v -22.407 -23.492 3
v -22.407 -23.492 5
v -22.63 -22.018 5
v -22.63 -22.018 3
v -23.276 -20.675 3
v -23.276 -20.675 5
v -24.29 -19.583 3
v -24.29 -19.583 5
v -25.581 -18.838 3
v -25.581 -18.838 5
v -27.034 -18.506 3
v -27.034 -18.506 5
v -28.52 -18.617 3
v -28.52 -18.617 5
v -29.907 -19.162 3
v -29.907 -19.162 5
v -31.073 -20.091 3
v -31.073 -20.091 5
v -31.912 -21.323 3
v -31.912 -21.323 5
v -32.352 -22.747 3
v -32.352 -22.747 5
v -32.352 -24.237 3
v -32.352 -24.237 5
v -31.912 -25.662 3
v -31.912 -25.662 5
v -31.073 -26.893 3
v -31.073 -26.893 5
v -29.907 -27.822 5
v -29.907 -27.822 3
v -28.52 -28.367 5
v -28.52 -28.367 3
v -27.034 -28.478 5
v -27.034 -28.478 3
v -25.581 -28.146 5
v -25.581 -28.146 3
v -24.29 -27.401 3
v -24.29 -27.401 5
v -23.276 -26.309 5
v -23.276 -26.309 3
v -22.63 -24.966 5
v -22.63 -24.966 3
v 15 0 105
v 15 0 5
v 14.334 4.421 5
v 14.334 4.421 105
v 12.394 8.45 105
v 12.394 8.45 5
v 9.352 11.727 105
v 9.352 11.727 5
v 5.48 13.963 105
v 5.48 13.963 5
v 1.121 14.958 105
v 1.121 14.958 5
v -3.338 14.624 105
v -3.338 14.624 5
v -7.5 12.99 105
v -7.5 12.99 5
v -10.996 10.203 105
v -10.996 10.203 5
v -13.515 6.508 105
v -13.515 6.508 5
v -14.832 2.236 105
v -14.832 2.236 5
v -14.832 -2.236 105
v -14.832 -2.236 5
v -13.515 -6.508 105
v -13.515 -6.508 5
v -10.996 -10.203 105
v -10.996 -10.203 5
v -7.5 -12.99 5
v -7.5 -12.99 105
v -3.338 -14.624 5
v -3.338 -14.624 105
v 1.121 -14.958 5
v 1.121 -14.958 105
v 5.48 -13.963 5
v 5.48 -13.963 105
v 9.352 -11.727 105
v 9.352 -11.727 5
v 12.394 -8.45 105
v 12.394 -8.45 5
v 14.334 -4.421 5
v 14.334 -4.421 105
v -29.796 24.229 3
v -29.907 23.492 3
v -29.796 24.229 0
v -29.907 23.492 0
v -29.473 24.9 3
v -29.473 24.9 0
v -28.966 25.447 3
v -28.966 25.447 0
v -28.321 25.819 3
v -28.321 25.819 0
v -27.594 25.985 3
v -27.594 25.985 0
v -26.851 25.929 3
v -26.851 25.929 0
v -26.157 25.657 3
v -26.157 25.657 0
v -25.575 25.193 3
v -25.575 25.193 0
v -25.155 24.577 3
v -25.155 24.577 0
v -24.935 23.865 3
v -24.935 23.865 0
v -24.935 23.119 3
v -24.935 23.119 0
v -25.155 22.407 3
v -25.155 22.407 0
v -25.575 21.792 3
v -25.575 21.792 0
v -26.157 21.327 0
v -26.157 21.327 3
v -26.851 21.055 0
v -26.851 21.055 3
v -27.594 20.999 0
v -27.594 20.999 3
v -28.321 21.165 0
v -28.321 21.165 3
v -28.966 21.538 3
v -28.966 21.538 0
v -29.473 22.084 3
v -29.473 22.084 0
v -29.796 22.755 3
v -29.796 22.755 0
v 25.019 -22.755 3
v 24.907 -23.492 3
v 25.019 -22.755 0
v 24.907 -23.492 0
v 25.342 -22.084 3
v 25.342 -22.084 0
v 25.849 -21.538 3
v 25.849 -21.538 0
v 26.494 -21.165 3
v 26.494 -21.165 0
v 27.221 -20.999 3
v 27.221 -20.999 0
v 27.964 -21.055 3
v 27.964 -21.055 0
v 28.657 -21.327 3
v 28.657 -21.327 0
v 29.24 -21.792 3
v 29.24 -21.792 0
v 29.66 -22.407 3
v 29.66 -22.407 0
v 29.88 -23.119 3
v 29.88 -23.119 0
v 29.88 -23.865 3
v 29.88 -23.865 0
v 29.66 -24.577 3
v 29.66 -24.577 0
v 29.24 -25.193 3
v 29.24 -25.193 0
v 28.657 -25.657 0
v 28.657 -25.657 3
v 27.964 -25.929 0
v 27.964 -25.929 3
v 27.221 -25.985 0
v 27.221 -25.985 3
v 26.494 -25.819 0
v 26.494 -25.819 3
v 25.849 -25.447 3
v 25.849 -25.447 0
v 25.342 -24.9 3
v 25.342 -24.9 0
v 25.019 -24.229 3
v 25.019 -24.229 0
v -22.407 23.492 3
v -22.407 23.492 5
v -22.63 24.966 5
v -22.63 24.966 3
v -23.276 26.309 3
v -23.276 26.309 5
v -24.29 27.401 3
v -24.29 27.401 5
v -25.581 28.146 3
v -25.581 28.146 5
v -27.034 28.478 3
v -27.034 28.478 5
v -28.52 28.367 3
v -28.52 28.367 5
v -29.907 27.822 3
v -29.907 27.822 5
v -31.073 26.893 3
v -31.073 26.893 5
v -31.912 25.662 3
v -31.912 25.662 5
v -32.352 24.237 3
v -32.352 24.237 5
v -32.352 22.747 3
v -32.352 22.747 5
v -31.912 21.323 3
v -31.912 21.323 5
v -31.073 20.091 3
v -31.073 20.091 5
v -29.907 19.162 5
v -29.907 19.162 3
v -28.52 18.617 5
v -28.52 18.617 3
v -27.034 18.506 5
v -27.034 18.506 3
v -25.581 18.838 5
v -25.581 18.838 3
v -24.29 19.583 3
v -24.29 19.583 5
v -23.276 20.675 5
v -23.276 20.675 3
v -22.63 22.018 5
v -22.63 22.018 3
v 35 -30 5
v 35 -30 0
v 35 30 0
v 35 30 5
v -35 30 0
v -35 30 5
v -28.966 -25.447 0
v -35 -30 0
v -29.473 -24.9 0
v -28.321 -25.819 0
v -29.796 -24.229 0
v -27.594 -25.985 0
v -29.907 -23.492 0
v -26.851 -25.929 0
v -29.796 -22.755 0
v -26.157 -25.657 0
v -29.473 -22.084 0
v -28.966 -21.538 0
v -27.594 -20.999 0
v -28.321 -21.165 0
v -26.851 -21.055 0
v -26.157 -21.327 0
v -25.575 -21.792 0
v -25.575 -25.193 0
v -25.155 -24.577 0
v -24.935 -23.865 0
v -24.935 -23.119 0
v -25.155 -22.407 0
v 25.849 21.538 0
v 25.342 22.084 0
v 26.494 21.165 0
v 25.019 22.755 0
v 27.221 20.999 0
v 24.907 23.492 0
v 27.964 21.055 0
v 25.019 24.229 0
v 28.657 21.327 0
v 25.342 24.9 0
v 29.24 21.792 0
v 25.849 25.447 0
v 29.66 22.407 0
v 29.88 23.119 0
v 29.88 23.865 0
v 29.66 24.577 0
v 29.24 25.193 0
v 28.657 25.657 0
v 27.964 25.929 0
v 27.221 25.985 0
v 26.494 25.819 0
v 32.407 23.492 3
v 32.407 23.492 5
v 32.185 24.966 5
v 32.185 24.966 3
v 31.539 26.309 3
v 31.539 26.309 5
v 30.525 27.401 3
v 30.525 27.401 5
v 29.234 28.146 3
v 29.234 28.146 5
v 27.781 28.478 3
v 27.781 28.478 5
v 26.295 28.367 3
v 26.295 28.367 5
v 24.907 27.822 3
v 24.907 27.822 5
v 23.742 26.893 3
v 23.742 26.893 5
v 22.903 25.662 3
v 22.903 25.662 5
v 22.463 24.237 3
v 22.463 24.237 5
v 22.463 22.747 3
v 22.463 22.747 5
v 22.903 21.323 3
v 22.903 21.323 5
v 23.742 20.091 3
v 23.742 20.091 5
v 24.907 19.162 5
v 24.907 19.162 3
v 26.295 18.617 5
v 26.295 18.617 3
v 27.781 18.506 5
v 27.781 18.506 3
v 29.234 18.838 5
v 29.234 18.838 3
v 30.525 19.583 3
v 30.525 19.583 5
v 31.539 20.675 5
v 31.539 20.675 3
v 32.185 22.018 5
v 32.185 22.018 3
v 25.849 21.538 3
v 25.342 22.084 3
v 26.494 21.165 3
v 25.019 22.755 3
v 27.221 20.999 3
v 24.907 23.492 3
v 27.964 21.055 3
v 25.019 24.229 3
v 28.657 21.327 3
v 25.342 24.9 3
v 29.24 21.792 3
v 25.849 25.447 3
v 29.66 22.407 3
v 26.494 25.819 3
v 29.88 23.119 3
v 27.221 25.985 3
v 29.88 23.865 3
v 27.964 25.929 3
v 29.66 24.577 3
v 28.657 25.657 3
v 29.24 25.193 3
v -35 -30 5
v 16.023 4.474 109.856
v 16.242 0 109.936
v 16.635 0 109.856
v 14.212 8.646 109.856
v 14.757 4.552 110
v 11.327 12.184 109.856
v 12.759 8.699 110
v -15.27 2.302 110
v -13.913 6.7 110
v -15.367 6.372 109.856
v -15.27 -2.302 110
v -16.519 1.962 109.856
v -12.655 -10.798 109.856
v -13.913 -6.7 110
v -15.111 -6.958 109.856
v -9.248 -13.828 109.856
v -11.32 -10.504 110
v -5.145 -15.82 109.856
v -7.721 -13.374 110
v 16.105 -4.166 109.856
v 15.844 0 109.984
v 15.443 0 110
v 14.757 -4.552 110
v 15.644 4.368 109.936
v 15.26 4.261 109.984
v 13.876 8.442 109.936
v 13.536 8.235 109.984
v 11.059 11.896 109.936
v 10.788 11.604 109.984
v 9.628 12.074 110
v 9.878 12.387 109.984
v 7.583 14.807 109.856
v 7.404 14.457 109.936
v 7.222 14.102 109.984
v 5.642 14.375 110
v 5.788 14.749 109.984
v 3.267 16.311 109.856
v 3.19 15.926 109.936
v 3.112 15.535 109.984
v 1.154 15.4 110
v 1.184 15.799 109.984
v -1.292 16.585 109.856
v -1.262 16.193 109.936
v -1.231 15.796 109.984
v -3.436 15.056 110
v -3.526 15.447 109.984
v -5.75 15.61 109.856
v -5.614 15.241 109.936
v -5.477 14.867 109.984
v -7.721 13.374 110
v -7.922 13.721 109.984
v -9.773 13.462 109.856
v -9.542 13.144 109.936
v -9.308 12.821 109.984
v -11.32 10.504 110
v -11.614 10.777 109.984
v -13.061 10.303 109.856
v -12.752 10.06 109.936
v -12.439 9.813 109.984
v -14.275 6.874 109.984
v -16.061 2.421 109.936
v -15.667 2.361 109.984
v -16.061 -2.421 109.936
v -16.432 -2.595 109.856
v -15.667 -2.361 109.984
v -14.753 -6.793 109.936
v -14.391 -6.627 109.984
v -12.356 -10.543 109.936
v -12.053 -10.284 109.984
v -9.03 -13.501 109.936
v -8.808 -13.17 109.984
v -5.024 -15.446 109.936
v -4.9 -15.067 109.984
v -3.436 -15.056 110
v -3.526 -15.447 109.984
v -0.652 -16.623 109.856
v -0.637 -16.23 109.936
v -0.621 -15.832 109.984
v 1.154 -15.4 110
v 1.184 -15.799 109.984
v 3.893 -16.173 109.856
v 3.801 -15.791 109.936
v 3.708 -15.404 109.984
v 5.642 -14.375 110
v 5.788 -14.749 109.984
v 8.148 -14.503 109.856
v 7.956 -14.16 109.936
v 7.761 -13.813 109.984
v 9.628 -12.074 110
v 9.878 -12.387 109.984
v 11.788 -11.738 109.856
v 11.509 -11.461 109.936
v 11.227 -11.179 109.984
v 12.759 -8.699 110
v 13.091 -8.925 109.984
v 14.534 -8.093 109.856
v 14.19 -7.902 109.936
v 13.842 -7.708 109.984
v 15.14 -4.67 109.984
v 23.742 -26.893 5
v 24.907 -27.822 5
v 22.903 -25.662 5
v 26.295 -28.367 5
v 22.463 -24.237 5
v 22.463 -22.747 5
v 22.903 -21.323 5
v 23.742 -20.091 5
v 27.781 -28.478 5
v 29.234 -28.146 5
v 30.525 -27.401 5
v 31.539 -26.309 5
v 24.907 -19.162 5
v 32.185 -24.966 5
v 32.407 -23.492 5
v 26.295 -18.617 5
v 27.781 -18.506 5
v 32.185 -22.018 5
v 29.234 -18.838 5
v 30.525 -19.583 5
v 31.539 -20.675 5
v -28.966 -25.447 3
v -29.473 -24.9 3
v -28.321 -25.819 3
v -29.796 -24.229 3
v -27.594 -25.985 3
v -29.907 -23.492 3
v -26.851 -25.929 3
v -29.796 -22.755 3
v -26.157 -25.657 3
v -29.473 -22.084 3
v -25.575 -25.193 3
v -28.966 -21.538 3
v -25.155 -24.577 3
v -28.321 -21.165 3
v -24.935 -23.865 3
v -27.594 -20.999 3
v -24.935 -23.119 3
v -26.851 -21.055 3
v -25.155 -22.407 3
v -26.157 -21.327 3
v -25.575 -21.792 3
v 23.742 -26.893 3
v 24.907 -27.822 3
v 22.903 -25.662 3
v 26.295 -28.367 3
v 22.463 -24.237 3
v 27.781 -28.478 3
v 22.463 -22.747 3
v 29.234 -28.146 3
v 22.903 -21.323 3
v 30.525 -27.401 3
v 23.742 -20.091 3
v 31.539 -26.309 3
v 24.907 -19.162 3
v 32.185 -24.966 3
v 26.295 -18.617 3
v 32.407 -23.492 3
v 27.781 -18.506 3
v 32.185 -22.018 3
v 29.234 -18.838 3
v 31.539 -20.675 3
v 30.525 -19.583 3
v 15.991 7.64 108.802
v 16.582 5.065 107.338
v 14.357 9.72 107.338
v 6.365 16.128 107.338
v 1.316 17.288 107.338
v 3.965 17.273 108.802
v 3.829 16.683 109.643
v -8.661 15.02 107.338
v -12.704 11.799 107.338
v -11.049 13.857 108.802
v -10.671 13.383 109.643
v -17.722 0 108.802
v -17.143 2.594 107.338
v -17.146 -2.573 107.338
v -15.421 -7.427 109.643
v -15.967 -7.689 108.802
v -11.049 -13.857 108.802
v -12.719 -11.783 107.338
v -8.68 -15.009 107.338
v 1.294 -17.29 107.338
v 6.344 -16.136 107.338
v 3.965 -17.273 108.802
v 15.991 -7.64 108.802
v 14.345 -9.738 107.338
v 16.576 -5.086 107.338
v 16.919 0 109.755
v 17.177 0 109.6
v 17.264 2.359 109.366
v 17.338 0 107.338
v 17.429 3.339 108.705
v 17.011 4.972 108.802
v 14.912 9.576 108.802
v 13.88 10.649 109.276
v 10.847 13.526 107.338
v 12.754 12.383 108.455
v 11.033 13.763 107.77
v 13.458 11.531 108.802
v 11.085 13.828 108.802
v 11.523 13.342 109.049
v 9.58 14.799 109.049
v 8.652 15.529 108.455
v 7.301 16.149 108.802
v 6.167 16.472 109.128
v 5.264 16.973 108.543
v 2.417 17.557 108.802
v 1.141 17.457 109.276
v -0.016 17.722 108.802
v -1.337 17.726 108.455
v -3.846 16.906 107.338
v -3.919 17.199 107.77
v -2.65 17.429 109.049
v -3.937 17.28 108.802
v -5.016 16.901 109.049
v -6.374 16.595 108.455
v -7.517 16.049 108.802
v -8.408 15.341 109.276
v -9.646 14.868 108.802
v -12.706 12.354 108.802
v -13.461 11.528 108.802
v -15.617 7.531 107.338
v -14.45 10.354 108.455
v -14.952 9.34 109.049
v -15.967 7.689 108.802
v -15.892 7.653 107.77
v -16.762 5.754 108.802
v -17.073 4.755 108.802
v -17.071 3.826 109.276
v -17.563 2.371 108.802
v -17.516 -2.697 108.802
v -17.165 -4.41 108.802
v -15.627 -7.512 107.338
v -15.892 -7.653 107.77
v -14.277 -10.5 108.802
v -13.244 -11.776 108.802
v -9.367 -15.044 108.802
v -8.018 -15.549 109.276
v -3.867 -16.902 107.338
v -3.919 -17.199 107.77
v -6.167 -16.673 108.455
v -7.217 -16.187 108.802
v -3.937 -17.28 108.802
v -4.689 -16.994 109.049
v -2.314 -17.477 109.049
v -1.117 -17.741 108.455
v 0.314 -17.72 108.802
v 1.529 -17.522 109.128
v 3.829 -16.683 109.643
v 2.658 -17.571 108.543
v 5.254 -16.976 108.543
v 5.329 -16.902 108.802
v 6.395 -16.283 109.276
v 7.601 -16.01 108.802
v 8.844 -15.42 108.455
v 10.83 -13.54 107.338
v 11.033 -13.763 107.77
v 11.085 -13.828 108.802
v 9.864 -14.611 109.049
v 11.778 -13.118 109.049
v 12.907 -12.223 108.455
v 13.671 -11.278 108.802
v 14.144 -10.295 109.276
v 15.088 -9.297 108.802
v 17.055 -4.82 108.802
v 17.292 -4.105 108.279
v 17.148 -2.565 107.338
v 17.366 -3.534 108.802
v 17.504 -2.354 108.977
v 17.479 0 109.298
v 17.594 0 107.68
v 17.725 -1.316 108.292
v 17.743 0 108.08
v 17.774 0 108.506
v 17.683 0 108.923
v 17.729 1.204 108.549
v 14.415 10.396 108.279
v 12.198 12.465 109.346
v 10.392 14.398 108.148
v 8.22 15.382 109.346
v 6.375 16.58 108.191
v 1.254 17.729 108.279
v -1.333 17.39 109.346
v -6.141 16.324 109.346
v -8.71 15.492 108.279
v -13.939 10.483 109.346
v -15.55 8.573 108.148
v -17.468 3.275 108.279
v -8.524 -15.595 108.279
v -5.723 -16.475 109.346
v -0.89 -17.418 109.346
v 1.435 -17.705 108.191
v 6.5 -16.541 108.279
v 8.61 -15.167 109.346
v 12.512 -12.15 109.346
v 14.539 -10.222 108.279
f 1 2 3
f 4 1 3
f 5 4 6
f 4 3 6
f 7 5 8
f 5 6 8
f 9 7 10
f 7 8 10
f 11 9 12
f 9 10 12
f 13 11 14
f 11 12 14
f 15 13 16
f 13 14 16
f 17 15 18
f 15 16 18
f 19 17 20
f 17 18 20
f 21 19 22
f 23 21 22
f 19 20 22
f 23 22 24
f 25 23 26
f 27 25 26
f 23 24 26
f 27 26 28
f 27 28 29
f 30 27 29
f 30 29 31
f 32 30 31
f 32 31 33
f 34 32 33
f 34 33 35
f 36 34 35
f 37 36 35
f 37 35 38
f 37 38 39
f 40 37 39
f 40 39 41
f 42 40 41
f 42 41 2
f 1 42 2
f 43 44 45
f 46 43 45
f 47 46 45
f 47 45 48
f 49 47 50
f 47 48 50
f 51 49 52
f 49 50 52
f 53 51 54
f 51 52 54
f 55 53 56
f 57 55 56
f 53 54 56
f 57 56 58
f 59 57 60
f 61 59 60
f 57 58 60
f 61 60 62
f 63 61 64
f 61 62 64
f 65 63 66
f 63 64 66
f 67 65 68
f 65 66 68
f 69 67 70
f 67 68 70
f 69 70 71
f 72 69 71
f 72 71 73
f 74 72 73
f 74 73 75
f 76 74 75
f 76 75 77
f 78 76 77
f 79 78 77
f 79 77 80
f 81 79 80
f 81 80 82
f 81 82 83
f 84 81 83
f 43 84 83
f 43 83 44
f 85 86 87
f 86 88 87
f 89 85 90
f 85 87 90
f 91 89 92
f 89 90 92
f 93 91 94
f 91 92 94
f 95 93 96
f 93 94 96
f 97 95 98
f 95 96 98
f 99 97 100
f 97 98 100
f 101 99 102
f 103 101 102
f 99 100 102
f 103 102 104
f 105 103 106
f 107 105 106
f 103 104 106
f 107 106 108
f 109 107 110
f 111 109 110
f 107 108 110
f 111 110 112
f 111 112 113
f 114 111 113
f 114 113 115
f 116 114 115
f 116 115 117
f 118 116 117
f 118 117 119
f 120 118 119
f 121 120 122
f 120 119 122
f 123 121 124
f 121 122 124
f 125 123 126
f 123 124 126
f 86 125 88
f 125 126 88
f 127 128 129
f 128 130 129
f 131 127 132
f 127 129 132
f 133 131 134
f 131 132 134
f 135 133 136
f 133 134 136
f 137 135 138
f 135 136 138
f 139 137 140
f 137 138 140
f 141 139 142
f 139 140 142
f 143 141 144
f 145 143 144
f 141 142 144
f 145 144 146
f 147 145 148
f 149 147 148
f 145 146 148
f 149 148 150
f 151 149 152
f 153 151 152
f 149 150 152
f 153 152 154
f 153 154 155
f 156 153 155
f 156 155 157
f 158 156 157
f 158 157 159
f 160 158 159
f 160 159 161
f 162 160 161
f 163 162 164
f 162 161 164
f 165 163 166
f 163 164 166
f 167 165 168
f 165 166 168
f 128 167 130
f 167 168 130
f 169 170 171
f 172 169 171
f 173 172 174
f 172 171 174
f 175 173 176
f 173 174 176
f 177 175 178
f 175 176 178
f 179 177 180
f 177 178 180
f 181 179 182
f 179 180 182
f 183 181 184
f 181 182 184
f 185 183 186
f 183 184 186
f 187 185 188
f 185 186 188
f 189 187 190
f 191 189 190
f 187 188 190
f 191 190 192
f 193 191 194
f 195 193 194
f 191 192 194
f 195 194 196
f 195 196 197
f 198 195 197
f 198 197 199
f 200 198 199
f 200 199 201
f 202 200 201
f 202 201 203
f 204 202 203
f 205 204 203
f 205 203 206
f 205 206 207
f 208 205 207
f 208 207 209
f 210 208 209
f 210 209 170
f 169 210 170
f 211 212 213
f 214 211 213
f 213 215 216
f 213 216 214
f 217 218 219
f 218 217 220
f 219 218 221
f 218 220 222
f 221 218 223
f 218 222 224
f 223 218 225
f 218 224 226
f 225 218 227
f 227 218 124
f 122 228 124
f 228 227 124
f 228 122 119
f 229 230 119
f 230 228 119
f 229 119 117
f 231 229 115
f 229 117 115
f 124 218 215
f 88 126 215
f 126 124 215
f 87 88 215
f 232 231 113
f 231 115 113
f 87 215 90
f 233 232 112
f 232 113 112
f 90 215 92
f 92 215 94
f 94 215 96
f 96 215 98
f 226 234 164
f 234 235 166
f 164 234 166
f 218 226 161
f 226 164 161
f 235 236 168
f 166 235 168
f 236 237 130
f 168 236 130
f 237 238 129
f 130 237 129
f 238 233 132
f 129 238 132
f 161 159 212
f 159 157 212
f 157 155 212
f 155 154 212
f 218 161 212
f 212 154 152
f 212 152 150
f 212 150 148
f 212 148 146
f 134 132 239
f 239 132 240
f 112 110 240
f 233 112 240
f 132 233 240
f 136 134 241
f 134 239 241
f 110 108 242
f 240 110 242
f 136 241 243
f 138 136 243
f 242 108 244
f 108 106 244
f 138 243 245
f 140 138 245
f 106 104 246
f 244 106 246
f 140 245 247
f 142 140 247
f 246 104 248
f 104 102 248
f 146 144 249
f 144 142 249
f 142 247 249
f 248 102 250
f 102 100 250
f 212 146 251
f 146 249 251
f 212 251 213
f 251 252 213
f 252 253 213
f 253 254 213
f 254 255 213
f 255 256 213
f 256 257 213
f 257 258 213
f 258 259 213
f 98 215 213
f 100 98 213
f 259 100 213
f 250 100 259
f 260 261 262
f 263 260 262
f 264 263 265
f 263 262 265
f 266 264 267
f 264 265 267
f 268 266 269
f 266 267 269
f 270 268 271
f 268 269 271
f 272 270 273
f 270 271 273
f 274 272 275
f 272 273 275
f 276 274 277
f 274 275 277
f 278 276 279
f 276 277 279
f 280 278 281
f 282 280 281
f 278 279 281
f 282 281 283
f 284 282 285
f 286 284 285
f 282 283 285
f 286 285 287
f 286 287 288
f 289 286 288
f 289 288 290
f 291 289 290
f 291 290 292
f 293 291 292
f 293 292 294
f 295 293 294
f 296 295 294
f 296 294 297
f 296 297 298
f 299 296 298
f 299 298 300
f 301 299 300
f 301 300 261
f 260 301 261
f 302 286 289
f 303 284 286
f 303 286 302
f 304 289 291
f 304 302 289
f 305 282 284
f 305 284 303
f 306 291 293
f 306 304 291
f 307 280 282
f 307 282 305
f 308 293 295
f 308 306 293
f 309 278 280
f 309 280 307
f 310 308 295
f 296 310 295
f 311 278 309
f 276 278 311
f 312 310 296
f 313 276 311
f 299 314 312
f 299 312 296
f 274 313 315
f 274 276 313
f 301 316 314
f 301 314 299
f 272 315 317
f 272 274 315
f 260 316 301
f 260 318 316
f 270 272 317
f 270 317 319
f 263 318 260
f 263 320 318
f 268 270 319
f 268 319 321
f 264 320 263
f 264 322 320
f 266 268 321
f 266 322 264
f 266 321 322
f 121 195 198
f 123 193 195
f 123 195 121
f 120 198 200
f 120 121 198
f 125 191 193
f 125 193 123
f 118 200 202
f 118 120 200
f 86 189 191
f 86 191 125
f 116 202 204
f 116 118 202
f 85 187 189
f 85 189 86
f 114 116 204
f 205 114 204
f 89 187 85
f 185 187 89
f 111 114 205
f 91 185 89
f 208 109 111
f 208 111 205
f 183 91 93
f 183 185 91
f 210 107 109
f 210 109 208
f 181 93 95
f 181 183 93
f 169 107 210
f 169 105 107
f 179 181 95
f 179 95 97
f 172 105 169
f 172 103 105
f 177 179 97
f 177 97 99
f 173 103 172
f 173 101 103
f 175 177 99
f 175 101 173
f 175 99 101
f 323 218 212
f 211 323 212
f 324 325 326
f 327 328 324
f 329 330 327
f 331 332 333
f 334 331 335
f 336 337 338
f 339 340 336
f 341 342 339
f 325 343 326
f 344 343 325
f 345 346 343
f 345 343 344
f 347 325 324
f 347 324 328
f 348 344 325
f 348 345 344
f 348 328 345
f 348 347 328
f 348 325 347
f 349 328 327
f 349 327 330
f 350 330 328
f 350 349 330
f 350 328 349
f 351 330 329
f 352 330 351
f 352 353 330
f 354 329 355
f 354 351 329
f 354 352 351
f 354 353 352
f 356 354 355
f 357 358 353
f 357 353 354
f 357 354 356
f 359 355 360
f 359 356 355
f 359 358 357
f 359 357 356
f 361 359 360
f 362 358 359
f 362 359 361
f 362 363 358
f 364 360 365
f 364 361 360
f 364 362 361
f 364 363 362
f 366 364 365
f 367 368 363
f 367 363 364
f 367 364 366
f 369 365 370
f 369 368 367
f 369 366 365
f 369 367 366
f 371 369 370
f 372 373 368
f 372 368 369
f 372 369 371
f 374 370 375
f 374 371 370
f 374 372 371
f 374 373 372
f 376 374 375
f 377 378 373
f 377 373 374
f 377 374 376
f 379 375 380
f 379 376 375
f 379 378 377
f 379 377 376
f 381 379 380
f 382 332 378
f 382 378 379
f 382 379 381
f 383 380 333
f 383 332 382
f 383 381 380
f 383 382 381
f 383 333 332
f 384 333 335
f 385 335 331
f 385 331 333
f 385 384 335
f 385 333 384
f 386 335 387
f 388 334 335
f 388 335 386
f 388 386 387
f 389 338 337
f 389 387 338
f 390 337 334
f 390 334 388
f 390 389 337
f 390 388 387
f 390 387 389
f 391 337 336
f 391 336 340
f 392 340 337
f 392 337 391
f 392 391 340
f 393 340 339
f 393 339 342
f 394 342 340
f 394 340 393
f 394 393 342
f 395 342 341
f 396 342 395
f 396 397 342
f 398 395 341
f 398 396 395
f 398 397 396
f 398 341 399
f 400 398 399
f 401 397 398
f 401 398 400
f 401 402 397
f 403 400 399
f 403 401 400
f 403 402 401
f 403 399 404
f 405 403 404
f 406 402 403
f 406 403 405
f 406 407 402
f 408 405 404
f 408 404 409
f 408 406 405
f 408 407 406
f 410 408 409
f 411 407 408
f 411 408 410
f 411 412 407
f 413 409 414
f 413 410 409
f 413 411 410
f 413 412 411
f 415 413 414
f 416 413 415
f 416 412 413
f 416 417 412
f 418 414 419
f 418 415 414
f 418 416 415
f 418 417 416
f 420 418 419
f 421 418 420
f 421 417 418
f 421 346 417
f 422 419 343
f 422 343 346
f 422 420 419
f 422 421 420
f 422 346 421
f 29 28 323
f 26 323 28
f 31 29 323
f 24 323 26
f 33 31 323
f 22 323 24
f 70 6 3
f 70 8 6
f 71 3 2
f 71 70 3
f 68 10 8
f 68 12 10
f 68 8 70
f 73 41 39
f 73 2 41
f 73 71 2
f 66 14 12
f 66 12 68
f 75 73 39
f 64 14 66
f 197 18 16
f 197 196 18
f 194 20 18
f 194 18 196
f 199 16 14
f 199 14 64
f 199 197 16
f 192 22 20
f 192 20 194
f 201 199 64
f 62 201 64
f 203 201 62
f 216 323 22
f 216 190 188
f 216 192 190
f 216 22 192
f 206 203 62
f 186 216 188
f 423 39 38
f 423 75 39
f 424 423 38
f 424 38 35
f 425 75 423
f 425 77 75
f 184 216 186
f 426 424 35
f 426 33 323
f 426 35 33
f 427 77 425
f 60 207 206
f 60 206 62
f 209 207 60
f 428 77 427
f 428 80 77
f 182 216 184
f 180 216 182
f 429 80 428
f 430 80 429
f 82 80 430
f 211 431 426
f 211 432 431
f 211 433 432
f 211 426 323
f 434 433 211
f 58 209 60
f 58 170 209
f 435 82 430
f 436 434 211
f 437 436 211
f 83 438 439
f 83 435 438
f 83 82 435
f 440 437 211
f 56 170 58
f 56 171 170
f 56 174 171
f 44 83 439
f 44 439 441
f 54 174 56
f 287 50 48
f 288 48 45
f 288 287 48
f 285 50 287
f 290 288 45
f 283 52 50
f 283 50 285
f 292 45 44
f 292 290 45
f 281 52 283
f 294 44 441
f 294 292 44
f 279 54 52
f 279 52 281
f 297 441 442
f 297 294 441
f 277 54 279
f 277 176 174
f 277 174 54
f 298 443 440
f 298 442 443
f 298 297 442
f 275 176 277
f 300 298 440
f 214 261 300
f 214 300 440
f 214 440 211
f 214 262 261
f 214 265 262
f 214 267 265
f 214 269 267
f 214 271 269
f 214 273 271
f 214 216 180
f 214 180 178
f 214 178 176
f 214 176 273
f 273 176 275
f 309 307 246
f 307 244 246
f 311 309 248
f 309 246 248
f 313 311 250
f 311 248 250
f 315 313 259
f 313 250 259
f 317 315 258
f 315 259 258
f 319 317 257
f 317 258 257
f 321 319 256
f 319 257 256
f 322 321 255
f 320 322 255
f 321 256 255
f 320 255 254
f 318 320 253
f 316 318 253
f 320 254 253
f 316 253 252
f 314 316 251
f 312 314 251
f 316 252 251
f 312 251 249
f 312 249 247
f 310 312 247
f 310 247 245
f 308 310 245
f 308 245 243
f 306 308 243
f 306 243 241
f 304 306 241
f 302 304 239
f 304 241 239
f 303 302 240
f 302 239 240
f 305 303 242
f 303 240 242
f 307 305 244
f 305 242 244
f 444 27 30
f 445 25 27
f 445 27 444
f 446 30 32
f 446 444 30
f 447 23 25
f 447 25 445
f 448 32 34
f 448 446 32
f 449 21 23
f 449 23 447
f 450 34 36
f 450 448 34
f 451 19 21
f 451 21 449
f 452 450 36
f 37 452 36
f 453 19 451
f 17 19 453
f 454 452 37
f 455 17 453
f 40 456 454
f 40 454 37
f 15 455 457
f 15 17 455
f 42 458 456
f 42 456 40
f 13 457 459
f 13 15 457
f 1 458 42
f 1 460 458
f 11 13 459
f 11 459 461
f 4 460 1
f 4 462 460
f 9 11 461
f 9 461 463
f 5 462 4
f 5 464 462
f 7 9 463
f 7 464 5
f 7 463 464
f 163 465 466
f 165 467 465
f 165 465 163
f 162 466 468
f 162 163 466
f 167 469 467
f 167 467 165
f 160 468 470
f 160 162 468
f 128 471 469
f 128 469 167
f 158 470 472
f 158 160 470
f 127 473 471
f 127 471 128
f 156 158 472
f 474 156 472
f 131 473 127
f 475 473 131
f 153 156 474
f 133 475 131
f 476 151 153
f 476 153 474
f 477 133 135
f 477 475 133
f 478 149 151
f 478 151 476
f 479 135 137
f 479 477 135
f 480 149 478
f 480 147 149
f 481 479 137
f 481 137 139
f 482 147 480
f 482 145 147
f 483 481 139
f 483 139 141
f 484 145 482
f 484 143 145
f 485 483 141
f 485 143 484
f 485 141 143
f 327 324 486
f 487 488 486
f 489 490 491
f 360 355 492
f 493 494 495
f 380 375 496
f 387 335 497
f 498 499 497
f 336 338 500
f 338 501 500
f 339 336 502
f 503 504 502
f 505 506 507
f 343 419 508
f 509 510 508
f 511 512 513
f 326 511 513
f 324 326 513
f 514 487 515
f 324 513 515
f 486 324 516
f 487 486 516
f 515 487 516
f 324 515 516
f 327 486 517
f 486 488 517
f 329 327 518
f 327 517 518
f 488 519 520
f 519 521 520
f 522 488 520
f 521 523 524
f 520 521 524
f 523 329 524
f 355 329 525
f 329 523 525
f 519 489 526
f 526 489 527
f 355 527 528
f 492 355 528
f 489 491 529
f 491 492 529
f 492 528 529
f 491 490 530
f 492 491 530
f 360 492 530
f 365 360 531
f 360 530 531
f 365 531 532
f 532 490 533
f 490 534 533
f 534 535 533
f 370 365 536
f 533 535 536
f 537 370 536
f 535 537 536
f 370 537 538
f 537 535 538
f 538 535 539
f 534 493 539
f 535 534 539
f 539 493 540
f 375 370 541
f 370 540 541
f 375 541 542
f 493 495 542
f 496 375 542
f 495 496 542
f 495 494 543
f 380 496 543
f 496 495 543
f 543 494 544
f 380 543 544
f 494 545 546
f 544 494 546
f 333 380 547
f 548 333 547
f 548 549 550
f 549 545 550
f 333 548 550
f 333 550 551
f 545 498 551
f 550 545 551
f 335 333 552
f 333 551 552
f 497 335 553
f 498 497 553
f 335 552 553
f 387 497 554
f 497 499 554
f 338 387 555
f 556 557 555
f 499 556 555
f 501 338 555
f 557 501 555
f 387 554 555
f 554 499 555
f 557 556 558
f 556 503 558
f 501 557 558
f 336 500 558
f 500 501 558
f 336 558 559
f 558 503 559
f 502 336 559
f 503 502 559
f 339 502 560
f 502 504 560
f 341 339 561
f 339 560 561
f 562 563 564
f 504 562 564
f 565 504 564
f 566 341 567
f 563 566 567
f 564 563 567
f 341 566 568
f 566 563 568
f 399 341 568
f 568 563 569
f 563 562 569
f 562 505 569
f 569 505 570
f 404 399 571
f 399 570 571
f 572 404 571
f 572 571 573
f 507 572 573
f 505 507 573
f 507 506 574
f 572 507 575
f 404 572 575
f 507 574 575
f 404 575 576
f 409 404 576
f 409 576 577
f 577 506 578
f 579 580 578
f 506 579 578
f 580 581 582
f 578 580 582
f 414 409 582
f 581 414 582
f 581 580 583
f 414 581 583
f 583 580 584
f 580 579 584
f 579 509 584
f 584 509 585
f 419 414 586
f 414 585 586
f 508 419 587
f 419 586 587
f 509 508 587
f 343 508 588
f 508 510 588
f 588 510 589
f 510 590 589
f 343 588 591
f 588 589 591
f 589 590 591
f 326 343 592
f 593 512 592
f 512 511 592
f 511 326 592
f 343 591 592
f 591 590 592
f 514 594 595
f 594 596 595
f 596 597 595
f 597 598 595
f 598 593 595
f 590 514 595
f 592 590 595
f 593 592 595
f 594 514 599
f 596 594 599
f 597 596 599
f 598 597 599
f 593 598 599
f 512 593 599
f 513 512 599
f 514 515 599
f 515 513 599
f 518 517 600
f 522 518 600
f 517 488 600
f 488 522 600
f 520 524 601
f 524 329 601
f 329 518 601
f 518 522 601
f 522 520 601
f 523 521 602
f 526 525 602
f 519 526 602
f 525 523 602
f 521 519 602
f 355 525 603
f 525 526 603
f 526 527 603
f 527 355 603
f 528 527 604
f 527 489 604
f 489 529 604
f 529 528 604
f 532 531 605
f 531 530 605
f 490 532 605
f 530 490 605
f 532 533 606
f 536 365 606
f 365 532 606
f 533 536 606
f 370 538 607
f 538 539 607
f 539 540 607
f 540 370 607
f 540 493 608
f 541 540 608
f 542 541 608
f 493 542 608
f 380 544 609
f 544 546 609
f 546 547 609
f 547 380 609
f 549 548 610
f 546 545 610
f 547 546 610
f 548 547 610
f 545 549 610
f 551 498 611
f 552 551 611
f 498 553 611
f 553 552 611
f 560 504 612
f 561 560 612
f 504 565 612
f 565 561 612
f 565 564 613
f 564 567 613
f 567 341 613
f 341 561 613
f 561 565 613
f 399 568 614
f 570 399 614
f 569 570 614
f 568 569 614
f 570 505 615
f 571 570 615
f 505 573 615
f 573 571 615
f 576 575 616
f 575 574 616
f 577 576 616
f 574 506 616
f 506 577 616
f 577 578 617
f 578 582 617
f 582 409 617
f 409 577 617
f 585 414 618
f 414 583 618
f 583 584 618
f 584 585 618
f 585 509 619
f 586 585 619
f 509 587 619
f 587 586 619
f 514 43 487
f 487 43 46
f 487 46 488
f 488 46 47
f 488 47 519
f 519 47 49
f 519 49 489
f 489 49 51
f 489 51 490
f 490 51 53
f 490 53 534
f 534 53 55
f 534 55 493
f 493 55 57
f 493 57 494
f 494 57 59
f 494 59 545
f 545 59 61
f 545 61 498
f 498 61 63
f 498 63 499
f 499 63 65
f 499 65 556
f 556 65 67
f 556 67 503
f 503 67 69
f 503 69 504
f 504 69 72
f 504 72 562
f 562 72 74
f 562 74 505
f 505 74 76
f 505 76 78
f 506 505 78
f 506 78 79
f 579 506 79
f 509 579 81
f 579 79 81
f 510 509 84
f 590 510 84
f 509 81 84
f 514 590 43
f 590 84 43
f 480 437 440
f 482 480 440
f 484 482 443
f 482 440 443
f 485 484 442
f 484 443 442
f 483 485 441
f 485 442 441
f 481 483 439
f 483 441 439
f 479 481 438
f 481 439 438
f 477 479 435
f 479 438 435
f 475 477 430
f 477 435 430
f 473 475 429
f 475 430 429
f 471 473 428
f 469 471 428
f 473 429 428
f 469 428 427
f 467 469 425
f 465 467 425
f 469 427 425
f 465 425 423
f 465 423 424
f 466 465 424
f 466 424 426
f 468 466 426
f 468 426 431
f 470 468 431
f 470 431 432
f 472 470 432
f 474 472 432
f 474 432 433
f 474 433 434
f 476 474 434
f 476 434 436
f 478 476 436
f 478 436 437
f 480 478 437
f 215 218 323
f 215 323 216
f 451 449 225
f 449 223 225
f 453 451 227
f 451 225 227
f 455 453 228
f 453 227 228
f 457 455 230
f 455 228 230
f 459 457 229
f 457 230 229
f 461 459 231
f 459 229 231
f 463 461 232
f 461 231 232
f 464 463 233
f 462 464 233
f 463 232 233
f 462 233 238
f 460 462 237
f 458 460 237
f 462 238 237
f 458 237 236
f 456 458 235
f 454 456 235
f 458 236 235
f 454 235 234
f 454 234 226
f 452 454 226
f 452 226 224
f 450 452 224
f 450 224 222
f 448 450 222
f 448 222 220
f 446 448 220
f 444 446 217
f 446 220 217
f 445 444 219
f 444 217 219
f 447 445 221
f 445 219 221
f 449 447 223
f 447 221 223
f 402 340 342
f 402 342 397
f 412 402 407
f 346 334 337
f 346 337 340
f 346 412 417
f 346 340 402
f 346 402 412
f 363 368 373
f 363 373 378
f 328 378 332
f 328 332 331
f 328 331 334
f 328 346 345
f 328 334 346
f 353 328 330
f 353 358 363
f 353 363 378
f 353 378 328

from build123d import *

# Parameters (mm, degrees)
F0_W           = 70
F0_H           = 60
F0_R           = 15
F1_DEPTH       = 5
F2_DEPTH       = 105
F3_R           = 18.75
F3_R_2         = 15
F4_DEPTH       = 5
F5_SIZE        = 3.74999
F7_R           = 1.5
F9_D           = 5
F9_DEPTH       = 5
F9_CBORE_D     = 10
F9_CBORE_DEPTH = 2
F9_TIP         = 1.5021515476


# Not quite as in the source:
# - a fillet or chamfer that OpenCascade refuses, or shapes differently, is made with other operations: its cross-section is extruded or revolved along the edge and cut away or added
# - a fillet or chamfer is up to 0.001 mm smaller than in the source, because OpenCascade refuses the exact size


with BuildPart() as f1:
    # F0 (on Top) → F1 (new body)
    with BuildSketch(Plane.XY):
        Rectangle(F0_W, F0_H)
        Circle(F0_R, mode=Mode.SUBTRACT)
    extrude(amount=F1_DEPTH)

    # F0 (on Top) → F2 (join)
    with BuildSketch(Plane.XY):
        Circle(F0_R)
    extrude(amount=F2_DEPTH)

    # F3 (on face) → F4 (join)
    with BuildSketch(Plane.XY.offset(105)):
        Circle(F3_R)
        Circle(F3_R_2, mode=Mode.SUBTRACT)
        Circle(F3_R_2)
    extrude(amount=F4_DEPTH)

    # F5 (size 3.75 in the source; OpenCascade refuses exactly that, so slightly less here)
    f5_edges = [f1.edges().sort_by_distance(p)[0] for p in [
        (-18.75, 0, 105),
    ]]
    chamfer(f5_edges, length=F5_SIZE)

    # F6: fillet of radius 5 on 1 edges, made by hand

    # F6_s1 → F6_t2 (revolve, cut)
    with BuildSketch(Plane.XZ):
        with BuildLine():
            ThreePointArc((18.75, 108.74999), (17.2105735463, 109.6770690609), (15.4427995223, 110))
            Line((15.4427995223, 110), (18.75, 110))
            Line((18.75, 110), (18.75, 108.74999))
        make_face()
    revolve(axis=Axis((0, 0, 110), (0, 0, 1)), mode=Mode.SUBTRACT)

    # F7
    f7_edges = [f1.edges().sort_by_distance(p)[0] for p in [
        (-18.75, 0, 108.74999),
    ]]
    fillet(f7_edges, radius=F7_R)

    # F9
    with Locations(Plane.XY.offset(5)):
        with Locations((-27.4074339763, 23.4920862654), (-27.4074339763, -23.4920862654), (27.4074339763, -23.4920862654), (27.4074339763, 23.4920862654)):
            CounterBoreHole(F9_D / 2, F9_CBORE_D / 2, F9_CBORE_DEPTH, depth=F9_DEPTH)
            with Locations((0, 0, -(F9_DEPTH + F9_TIP / 2))):  # 118° drill point
                Cone(0, F9_D / 2, F9_TIP, mode=Mode.SUBTRACT)


solid = f1.part
